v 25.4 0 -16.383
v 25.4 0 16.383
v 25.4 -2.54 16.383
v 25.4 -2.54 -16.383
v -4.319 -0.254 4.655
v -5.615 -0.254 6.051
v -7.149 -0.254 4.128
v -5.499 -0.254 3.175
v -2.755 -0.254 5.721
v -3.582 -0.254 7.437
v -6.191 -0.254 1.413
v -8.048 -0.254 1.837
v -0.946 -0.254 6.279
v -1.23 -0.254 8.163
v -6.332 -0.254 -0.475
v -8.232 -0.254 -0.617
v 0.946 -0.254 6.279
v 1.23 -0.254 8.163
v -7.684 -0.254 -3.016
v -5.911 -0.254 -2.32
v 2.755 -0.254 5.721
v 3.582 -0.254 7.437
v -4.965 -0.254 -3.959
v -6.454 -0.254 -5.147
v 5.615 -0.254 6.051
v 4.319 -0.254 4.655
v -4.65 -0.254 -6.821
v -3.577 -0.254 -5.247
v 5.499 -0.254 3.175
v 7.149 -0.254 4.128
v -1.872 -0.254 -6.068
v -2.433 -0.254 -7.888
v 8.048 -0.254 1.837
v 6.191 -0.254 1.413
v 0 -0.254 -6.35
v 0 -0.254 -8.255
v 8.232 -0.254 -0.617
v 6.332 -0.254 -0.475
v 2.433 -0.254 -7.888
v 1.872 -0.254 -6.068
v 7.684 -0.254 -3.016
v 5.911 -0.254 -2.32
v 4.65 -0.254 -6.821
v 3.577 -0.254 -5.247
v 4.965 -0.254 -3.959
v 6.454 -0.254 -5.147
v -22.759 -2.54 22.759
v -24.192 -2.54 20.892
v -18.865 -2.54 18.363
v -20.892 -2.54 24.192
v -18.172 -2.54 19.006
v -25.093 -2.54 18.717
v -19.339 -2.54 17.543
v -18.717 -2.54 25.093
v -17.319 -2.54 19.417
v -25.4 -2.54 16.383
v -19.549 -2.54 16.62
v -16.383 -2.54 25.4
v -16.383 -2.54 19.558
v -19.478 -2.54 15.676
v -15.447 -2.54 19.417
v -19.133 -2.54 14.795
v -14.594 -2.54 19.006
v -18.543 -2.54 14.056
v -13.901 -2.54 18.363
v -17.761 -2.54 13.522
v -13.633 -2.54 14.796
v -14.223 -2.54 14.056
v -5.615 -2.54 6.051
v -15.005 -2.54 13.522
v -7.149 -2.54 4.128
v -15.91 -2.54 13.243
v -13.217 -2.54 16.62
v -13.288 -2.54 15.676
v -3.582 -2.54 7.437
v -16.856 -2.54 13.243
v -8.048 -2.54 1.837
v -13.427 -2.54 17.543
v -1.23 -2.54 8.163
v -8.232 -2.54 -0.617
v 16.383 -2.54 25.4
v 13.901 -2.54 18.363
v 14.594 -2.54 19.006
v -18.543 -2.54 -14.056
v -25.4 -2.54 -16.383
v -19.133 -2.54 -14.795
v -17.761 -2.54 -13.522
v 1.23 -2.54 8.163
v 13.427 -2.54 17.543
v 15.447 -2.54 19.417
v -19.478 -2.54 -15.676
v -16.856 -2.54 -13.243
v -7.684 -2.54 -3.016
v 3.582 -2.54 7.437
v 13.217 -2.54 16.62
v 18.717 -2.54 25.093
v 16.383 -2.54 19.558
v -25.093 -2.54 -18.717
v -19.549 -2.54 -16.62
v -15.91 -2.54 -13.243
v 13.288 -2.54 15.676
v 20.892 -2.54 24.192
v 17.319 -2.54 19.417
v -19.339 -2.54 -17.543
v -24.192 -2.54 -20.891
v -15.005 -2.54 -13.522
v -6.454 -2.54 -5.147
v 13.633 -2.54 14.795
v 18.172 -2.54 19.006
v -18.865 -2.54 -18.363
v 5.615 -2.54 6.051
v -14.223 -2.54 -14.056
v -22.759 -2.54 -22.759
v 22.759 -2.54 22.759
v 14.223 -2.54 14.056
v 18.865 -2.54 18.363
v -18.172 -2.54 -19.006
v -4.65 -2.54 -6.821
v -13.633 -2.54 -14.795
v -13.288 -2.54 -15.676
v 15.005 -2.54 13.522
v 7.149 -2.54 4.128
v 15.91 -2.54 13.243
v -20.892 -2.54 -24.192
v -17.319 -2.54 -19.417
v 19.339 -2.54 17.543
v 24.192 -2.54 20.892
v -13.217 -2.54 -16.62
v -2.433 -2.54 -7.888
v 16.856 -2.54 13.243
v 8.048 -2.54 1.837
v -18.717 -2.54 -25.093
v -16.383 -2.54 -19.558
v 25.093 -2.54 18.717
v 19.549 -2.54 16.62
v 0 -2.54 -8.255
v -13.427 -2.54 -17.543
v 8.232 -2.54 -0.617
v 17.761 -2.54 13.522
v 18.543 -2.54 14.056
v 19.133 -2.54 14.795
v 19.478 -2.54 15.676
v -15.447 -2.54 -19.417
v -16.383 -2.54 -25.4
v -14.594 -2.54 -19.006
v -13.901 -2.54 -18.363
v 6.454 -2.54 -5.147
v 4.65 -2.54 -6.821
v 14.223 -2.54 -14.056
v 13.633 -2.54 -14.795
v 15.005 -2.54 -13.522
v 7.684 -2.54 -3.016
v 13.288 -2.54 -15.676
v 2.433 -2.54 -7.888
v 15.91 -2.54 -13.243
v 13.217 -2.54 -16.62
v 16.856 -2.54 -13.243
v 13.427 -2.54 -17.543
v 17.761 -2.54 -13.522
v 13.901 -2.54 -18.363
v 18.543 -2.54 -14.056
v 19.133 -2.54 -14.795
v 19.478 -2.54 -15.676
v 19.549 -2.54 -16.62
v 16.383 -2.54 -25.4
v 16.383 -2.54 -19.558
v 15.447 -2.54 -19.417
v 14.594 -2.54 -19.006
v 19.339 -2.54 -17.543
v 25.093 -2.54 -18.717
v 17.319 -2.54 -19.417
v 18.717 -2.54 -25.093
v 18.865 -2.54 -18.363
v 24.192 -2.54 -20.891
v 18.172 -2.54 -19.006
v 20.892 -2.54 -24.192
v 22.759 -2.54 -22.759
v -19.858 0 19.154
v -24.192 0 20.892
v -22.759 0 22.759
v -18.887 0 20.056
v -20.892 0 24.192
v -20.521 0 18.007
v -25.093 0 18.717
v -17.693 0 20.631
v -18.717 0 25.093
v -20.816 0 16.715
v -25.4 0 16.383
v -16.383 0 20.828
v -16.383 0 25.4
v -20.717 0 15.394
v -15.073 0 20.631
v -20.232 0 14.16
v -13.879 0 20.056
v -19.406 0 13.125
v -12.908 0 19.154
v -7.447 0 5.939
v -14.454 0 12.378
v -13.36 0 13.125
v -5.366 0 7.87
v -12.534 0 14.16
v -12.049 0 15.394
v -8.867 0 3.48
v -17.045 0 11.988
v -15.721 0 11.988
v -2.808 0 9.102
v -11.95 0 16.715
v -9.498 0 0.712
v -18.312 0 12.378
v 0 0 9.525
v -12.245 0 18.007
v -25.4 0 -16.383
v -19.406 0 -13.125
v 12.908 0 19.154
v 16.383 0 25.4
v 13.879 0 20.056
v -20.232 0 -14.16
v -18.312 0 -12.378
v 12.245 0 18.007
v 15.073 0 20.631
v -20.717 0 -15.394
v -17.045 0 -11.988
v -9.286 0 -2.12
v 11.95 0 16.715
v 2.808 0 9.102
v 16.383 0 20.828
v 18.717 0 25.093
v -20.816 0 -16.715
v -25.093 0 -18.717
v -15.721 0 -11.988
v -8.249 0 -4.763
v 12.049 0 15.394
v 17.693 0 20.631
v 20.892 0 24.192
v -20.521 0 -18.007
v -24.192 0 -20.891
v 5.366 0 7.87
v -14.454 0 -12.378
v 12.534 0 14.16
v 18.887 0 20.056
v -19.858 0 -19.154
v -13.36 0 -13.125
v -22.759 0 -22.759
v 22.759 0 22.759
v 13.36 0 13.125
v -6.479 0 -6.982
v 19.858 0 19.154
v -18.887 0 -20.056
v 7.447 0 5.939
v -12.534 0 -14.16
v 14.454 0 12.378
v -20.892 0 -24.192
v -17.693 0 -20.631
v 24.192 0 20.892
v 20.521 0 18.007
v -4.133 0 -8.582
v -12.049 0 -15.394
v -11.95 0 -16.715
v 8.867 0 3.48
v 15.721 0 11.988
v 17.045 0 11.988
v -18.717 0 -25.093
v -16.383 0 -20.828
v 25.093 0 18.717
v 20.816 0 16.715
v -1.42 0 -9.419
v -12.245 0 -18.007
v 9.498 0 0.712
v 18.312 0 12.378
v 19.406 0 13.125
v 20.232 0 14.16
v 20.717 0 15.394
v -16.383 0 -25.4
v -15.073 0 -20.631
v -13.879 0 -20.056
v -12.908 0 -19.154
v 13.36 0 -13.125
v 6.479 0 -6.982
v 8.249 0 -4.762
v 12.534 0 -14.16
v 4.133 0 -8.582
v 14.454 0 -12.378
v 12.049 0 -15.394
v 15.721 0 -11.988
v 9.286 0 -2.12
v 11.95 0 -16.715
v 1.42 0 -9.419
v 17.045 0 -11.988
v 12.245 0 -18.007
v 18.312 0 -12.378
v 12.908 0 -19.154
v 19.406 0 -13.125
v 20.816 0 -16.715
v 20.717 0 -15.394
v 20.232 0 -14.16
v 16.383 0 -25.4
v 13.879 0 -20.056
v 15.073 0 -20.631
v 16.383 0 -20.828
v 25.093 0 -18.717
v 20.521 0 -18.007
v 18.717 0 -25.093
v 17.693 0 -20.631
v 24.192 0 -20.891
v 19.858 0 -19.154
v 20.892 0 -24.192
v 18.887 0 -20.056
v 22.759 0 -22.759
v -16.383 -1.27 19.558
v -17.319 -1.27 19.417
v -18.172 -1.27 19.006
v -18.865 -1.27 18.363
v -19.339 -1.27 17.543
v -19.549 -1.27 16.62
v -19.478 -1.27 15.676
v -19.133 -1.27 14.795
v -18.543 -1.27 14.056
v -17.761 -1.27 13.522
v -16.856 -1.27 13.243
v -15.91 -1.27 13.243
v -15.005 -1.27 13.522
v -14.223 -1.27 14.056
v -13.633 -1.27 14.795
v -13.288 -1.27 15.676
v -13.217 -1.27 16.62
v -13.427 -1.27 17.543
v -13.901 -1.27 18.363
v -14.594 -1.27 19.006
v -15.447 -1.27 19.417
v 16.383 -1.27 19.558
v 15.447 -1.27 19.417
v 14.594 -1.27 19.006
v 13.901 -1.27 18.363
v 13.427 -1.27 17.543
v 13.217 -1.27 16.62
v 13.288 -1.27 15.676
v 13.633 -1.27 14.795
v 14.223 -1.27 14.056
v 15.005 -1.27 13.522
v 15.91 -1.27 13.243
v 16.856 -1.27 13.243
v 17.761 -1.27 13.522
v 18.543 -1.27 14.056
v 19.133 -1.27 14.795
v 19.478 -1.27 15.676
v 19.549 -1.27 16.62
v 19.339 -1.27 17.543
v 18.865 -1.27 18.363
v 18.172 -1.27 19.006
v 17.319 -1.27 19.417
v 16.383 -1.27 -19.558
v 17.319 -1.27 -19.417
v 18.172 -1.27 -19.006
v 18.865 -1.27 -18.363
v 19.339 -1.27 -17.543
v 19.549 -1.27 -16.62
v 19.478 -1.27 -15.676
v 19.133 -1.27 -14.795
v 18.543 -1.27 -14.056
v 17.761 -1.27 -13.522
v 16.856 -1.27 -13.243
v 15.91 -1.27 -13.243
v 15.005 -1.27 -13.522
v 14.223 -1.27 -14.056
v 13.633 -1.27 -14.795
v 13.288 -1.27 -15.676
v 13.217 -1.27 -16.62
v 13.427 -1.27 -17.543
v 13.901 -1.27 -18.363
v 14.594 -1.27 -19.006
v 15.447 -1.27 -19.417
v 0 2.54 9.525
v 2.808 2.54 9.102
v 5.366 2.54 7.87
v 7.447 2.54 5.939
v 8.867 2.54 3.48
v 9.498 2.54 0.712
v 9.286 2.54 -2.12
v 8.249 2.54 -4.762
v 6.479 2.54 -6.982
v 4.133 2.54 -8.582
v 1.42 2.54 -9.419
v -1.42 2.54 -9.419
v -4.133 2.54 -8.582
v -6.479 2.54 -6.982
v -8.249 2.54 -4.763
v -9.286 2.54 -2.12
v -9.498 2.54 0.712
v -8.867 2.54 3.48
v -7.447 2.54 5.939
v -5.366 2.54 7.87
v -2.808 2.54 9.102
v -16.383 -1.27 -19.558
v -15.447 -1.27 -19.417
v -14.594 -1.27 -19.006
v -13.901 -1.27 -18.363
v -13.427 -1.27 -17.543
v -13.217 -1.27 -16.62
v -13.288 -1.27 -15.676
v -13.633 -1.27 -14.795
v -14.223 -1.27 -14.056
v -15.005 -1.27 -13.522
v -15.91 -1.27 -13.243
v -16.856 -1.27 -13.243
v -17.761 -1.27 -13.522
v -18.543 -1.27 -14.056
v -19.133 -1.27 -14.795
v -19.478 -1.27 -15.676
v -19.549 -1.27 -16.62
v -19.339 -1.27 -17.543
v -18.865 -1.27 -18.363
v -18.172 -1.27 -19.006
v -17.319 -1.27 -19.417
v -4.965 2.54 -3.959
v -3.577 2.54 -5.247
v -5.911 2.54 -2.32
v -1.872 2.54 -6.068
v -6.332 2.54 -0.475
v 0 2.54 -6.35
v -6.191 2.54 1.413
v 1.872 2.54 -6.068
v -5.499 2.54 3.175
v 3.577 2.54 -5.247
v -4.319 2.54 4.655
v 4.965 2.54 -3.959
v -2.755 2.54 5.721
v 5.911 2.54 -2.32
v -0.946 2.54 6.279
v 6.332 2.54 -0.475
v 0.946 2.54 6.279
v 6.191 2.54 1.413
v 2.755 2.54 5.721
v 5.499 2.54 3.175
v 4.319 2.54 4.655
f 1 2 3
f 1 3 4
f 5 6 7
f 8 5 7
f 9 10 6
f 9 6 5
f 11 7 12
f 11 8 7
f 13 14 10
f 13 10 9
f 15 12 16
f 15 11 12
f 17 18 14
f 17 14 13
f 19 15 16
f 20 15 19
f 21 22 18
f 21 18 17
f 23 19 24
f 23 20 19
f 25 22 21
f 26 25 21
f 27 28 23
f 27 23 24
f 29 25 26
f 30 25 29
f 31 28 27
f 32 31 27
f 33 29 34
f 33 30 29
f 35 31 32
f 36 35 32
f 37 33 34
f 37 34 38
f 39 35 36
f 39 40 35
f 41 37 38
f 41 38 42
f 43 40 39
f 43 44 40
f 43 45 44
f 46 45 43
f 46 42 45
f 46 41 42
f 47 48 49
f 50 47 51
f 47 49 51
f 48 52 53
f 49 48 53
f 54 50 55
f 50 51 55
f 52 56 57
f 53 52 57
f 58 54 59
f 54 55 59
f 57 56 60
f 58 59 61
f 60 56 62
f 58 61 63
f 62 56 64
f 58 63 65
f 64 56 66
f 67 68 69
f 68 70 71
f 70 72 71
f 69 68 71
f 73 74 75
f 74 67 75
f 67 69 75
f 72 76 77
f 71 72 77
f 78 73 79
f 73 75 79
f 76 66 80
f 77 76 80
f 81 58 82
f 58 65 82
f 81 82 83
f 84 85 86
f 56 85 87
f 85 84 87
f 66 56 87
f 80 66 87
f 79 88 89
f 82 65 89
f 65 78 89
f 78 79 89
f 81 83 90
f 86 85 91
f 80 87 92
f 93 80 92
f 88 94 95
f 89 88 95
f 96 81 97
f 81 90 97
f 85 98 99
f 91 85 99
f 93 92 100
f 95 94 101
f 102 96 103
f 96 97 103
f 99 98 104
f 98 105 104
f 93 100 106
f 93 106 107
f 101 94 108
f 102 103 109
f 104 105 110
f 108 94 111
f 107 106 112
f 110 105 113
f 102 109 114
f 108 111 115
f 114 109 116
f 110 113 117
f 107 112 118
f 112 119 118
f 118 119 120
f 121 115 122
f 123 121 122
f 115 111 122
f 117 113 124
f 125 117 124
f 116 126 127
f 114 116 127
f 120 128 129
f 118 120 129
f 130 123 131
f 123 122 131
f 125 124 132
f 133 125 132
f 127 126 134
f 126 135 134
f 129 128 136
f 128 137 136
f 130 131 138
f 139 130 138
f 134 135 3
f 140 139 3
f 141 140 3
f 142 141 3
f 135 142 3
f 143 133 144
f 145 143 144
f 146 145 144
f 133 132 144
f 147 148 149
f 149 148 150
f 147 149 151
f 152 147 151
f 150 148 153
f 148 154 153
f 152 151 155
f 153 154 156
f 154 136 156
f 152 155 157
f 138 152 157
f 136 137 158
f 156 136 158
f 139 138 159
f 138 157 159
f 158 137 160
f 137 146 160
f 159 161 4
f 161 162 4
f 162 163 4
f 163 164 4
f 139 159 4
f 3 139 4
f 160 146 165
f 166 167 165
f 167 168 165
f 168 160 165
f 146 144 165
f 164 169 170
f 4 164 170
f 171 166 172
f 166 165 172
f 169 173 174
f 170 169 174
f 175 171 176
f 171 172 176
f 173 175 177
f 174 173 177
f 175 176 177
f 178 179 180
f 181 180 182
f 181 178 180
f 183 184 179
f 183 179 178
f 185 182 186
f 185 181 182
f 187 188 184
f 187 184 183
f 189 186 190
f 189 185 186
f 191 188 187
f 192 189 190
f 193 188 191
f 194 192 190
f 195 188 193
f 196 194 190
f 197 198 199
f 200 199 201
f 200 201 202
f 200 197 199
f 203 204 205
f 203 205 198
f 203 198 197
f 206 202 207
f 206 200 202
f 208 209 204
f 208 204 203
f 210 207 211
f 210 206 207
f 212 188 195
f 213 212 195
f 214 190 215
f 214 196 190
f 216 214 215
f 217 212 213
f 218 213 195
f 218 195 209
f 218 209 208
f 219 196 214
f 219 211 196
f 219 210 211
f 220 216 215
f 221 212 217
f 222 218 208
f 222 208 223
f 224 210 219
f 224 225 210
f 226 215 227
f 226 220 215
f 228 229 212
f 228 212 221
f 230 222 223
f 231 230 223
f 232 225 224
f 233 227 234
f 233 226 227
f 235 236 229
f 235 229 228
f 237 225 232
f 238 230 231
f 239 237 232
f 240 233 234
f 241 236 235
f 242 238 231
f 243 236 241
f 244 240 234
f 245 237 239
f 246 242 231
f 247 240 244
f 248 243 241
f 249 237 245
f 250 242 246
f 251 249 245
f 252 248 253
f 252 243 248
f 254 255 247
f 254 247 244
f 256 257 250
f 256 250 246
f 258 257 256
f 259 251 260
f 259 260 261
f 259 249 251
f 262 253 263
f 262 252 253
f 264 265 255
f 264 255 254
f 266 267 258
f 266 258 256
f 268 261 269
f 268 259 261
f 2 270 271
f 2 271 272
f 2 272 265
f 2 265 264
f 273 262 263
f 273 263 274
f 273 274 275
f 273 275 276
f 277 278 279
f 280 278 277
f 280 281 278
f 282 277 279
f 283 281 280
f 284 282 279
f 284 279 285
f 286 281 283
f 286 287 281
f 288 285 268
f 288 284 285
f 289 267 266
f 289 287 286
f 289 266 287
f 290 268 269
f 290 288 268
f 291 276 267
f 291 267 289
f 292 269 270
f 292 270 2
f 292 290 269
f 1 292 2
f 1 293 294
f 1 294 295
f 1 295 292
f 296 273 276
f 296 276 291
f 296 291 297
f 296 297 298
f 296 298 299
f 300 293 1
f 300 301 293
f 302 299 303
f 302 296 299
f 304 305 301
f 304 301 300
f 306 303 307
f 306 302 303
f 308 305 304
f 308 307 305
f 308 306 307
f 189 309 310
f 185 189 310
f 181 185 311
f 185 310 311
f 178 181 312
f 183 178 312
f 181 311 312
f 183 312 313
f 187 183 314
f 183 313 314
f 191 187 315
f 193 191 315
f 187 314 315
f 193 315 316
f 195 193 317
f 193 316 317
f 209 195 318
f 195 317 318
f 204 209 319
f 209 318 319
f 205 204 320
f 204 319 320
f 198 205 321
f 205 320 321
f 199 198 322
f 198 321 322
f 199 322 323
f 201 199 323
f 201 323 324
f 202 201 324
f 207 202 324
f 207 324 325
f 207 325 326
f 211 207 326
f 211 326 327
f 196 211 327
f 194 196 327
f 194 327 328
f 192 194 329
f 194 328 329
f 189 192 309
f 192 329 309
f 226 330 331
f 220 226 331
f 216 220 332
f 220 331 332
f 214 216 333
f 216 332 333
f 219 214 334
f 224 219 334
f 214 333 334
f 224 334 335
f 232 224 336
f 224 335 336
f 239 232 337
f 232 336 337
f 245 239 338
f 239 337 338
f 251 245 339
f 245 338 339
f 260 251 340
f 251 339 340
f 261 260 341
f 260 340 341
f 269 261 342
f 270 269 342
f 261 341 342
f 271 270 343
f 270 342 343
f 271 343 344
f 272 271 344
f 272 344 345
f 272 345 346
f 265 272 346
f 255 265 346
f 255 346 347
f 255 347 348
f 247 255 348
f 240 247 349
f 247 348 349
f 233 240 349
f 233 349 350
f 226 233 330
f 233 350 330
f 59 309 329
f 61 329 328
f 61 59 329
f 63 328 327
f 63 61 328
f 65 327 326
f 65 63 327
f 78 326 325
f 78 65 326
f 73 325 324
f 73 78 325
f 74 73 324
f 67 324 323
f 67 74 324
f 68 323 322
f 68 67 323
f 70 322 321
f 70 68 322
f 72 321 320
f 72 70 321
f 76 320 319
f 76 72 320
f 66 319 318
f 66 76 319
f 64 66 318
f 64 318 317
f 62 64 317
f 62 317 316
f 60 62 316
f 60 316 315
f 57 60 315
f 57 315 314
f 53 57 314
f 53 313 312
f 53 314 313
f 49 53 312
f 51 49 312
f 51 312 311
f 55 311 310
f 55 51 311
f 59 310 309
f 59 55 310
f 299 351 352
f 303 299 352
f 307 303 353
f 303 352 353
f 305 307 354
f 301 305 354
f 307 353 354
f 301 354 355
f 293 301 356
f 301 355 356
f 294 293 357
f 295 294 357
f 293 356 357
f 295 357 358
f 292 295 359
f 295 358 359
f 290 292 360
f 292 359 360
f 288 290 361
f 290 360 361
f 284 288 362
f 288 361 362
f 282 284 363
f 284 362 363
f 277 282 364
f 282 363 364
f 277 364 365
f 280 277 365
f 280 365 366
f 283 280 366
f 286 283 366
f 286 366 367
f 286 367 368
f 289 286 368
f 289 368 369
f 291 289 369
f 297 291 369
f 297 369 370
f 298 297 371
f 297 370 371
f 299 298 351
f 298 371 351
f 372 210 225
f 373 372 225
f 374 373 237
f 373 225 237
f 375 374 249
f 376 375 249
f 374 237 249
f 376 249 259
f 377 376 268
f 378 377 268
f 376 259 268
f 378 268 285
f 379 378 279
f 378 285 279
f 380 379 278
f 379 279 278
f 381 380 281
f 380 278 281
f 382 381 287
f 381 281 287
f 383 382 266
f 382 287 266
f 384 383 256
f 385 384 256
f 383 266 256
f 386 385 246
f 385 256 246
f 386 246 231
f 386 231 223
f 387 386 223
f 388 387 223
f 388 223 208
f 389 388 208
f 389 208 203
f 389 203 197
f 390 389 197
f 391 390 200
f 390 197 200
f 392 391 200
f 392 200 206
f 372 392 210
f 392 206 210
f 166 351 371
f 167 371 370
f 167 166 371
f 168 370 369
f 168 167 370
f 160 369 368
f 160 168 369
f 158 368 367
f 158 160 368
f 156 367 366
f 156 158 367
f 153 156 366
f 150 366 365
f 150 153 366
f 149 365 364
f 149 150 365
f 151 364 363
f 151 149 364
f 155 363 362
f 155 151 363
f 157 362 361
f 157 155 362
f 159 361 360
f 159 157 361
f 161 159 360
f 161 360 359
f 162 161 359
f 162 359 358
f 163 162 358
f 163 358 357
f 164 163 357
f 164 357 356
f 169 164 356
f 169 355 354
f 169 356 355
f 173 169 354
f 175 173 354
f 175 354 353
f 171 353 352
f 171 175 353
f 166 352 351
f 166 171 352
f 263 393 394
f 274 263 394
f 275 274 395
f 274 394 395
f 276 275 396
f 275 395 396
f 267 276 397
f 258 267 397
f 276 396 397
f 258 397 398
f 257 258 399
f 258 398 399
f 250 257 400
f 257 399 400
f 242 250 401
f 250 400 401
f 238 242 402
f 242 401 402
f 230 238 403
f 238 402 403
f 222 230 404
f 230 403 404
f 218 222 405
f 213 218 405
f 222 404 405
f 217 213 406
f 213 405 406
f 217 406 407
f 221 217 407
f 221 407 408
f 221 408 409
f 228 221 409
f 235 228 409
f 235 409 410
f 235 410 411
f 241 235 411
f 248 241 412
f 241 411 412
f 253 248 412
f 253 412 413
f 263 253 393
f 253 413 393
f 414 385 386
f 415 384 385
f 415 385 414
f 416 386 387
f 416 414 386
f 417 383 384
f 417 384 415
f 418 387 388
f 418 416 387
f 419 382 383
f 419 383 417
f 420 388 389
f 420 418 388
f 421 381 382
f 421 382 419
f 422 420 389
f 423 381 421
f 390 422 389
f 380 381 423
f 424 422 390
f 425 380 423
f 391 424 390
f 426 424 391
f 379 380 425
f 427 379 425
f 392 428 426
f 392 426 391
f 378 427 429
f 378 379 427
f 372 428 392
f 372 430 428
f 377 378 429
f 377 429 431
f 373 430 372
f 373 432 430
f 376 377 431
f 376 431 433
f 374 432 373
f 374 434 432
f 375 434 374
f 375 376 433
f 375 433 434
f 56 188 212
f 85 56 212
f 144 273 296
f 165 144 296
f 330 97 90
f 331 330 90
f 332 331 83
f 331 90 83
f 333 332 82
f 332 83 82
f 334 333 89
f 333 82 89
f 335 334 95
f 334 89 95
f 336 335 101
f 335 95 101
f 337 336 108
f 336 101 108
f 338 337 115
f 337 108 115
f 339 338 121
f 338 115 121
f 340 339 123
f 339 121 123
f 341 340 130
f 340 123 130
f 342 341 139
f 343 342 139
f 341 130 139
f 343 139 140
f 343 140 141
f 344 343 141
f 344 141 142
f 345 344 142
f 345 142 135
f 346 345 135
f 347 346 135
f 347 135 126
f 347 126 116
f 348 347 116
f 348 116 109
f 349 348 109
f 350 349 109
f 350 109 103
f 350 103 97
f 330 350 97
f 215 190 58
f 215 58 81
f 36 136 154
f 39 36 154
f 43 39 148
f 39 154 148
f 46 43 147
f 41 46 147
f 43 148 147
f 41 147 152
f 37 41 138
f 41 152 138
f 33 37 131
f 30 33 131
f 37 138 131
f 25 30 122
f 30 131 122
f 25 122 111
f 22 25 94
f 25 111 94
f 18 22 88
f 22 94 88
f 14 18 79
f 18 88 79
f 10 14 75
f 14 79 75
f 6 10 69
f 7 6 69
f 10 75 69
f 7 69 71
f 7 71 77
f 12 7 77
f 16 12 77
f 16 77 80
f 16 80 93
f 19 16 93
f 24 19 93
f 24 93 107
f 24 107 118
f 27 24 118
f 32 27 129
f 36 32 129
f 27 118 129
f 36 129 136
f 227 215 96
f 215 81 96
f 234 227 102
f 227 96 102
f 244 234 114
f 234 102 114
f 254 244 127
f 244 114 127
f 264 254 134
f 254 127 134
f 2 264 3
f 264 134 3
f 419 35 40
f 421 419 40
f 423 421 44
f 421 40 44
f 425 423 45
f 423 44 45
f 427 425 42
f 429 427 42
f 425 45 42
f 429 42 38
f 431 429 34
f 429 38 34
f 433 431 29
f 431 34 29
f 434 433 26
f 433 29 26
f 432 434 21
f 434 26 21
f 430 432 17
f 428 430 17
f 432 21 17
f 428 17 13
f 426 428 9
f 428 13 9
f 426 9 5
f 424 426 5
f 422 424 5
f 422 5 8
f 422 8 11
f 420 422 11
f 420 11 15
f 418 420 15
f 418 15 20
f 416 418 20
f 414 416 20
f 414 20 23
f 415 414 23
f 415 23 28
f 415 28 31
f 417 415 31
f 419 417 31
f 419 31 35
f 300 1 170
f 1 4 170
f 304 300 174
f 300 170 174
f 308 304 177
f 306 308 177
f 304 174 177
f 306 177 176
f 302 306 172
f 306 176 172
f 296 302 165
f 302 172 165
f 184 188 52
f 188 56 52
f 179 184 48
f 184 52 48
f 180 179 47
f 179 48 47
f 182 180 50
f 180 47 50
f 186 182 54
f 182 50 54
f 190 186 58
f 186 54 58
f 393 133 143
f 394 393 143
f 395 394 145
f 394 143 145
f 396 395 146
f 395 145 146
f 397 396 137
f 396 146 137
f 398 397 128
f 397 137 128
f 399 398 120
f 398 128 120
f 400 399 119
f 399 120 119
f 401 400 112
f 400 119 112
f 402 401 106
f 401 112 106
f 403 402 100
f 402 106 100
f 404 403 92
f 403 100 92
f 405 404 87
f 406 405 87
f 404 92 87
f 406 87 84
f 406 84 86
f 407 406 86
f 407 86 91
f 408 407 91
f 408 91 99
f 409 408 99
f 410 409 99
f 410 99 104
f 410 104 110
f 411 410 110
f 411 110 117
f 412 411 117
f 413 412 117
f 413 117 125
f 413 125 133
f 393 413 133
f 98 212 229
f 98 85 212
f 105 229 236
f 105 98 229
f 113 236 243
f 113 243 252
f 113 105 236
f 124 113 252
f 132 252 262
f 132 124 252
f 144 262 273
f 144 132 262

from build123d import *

# Parameters (mm, degrees)
SKETCH2_W               = 50.8
SKETCH2_H               = 50.8
BASE_FLANGE1_DEPTH      = 2.54
FILLET1_R               = 9.017
SKETCH9_R               = 9.525
BOSS_EXTRUDE1_DEPTH     = 2.54
SKETCH10_R              = 8.255
CUT_EXTRUDE1_DEPTH      = 2.286
SKETCH11_R              = 6.35
CUT_EXTRUDE2_DEPTH      = 37.029521729
SKETCH12_R              = 3.175
CUT_EXTRUDE4_DEPTH      = 37.278456417
MIRROR2_COPY_1_SKETCH_R = 3.175
MIRROR2_COPY_1_DEPTH    = 37.278456417
CHAMFER1_SIZE           = 1.27


# Sheet-metal steps are written as plain solids
with BuildPart() as part:
    # Sketch2 → Base-Flange1 (new body)
    with BuildSketch(Plane(origin=(0, 0, 0), x_dir=(1, 0, 0), z_dir=(0, 1, 0))):
        Rectangle(SKETCH2_W, SKETCH2_H)
    extrude(amount=-BASE_FLANGE1_DEPTH)

    # Fillet1
    fillet1_edges = [part.edges().sort_by_distance(p)[0] for p in [
        (25.4, -1.27, 25.4),
        (-25.4, -1.27, 25.4),
        (-25.4, -1.27, -25.4),
        (25.4, -1.27, -25.4),
    ]]
    fillet(fillet1_edges, radius=FILLET1_R)

    # Sketch9 → Boss-Extrude1 (add)
    with BuildSketch(Plane(origin=(0, 0, 0), x_dir=(1, 0, 0), z_dir=(0, 1, 0))):
        with Locations(Location((0, 0, 0), (0, 0, 270))):
            Circle(SKETCH9_R)
    extrude(amount=BOSS_EXTRUDE1_DEPTH)

    # Sketch10 → Cut-Extrude1 (cut)
    with BuildSketch(Plane.XZ.offset(2.54)):
        with Locations(Location((0, 0, 0), (0, 0, 270))):
            Circle(SKETCH10_R)
    extrude(amount=-CUT_EXTRUDE1_DEPTH, mode=Mode.SUBTRACT)

    # Sketch11 → Cut-Extrude2 (cut, through all)
    with BuildSketch(Plane.XZ.offset(0.254)):
        with Locations(Location((0, 0, 0), (0, 0, 270))):
            Circle(SKETCH11_R)
    extrude(amount=-CUT_EXTRUDE2_DEPTH, mode=Mode.SUBTRACT)

    # Sketch12 → Cut-Extrude4 (cut, through all)
    with BuildSketch(Plane.XZ.offset(2.54)):
        with Locations(Location((-16.383, -16.383, 0), (0, 0, 270))):
            Circle(SKETCH12_R)
    cut_extrude4 = extrude(amount=-CUT_EXTRUDE4_DEPTH, mode=Mode.SUBTRACT)

    # Mirror1: Cut-Extrude4 across plane
    add(cut_extrude4.mirror(Plane(origin=(0, 0, 0), x_dir=(0, 0, 1), z_dir=(1, 0, 0))), mode=Mode.SUBTRACT)

    # Mirror2: Cut-Extrude4 across plane
    add(cut_extrude4.mirror(Plane.XY), mode=Mode.SUBTRACT)

    # Mirror2 copy 1 sketch → Mirror2 copy 1 (cut, through all)
    with BuildSketch(Plane(origin=(0, -2.54, 0), x_dir=(-1, 0, 0), z_dir=(0, -1, 0))):
        with Locations(Location((-16.383, -16.383, 0), (0, 0, 270))):
            Circle(MIRROR2_COPY_1_SKETCH_R)
    extrude(amount=-MIRROR2_COPY_1_DEPTH, mode=Mode.SUBTRACT)

    # Chamfer1
    chamfer1_edges = [part.edges().sort_by_distance(p)[0] for p in [
        (-16.383, 0, -13.208),
        (16.383, 0, -13.208),
        (16.383, 0, 13.208),
        (-16.383, 0, 13.208),
    ]]
    chamfer(chamfer1_edges, length=CHAMFER1_SIZE)


solid = part.part
